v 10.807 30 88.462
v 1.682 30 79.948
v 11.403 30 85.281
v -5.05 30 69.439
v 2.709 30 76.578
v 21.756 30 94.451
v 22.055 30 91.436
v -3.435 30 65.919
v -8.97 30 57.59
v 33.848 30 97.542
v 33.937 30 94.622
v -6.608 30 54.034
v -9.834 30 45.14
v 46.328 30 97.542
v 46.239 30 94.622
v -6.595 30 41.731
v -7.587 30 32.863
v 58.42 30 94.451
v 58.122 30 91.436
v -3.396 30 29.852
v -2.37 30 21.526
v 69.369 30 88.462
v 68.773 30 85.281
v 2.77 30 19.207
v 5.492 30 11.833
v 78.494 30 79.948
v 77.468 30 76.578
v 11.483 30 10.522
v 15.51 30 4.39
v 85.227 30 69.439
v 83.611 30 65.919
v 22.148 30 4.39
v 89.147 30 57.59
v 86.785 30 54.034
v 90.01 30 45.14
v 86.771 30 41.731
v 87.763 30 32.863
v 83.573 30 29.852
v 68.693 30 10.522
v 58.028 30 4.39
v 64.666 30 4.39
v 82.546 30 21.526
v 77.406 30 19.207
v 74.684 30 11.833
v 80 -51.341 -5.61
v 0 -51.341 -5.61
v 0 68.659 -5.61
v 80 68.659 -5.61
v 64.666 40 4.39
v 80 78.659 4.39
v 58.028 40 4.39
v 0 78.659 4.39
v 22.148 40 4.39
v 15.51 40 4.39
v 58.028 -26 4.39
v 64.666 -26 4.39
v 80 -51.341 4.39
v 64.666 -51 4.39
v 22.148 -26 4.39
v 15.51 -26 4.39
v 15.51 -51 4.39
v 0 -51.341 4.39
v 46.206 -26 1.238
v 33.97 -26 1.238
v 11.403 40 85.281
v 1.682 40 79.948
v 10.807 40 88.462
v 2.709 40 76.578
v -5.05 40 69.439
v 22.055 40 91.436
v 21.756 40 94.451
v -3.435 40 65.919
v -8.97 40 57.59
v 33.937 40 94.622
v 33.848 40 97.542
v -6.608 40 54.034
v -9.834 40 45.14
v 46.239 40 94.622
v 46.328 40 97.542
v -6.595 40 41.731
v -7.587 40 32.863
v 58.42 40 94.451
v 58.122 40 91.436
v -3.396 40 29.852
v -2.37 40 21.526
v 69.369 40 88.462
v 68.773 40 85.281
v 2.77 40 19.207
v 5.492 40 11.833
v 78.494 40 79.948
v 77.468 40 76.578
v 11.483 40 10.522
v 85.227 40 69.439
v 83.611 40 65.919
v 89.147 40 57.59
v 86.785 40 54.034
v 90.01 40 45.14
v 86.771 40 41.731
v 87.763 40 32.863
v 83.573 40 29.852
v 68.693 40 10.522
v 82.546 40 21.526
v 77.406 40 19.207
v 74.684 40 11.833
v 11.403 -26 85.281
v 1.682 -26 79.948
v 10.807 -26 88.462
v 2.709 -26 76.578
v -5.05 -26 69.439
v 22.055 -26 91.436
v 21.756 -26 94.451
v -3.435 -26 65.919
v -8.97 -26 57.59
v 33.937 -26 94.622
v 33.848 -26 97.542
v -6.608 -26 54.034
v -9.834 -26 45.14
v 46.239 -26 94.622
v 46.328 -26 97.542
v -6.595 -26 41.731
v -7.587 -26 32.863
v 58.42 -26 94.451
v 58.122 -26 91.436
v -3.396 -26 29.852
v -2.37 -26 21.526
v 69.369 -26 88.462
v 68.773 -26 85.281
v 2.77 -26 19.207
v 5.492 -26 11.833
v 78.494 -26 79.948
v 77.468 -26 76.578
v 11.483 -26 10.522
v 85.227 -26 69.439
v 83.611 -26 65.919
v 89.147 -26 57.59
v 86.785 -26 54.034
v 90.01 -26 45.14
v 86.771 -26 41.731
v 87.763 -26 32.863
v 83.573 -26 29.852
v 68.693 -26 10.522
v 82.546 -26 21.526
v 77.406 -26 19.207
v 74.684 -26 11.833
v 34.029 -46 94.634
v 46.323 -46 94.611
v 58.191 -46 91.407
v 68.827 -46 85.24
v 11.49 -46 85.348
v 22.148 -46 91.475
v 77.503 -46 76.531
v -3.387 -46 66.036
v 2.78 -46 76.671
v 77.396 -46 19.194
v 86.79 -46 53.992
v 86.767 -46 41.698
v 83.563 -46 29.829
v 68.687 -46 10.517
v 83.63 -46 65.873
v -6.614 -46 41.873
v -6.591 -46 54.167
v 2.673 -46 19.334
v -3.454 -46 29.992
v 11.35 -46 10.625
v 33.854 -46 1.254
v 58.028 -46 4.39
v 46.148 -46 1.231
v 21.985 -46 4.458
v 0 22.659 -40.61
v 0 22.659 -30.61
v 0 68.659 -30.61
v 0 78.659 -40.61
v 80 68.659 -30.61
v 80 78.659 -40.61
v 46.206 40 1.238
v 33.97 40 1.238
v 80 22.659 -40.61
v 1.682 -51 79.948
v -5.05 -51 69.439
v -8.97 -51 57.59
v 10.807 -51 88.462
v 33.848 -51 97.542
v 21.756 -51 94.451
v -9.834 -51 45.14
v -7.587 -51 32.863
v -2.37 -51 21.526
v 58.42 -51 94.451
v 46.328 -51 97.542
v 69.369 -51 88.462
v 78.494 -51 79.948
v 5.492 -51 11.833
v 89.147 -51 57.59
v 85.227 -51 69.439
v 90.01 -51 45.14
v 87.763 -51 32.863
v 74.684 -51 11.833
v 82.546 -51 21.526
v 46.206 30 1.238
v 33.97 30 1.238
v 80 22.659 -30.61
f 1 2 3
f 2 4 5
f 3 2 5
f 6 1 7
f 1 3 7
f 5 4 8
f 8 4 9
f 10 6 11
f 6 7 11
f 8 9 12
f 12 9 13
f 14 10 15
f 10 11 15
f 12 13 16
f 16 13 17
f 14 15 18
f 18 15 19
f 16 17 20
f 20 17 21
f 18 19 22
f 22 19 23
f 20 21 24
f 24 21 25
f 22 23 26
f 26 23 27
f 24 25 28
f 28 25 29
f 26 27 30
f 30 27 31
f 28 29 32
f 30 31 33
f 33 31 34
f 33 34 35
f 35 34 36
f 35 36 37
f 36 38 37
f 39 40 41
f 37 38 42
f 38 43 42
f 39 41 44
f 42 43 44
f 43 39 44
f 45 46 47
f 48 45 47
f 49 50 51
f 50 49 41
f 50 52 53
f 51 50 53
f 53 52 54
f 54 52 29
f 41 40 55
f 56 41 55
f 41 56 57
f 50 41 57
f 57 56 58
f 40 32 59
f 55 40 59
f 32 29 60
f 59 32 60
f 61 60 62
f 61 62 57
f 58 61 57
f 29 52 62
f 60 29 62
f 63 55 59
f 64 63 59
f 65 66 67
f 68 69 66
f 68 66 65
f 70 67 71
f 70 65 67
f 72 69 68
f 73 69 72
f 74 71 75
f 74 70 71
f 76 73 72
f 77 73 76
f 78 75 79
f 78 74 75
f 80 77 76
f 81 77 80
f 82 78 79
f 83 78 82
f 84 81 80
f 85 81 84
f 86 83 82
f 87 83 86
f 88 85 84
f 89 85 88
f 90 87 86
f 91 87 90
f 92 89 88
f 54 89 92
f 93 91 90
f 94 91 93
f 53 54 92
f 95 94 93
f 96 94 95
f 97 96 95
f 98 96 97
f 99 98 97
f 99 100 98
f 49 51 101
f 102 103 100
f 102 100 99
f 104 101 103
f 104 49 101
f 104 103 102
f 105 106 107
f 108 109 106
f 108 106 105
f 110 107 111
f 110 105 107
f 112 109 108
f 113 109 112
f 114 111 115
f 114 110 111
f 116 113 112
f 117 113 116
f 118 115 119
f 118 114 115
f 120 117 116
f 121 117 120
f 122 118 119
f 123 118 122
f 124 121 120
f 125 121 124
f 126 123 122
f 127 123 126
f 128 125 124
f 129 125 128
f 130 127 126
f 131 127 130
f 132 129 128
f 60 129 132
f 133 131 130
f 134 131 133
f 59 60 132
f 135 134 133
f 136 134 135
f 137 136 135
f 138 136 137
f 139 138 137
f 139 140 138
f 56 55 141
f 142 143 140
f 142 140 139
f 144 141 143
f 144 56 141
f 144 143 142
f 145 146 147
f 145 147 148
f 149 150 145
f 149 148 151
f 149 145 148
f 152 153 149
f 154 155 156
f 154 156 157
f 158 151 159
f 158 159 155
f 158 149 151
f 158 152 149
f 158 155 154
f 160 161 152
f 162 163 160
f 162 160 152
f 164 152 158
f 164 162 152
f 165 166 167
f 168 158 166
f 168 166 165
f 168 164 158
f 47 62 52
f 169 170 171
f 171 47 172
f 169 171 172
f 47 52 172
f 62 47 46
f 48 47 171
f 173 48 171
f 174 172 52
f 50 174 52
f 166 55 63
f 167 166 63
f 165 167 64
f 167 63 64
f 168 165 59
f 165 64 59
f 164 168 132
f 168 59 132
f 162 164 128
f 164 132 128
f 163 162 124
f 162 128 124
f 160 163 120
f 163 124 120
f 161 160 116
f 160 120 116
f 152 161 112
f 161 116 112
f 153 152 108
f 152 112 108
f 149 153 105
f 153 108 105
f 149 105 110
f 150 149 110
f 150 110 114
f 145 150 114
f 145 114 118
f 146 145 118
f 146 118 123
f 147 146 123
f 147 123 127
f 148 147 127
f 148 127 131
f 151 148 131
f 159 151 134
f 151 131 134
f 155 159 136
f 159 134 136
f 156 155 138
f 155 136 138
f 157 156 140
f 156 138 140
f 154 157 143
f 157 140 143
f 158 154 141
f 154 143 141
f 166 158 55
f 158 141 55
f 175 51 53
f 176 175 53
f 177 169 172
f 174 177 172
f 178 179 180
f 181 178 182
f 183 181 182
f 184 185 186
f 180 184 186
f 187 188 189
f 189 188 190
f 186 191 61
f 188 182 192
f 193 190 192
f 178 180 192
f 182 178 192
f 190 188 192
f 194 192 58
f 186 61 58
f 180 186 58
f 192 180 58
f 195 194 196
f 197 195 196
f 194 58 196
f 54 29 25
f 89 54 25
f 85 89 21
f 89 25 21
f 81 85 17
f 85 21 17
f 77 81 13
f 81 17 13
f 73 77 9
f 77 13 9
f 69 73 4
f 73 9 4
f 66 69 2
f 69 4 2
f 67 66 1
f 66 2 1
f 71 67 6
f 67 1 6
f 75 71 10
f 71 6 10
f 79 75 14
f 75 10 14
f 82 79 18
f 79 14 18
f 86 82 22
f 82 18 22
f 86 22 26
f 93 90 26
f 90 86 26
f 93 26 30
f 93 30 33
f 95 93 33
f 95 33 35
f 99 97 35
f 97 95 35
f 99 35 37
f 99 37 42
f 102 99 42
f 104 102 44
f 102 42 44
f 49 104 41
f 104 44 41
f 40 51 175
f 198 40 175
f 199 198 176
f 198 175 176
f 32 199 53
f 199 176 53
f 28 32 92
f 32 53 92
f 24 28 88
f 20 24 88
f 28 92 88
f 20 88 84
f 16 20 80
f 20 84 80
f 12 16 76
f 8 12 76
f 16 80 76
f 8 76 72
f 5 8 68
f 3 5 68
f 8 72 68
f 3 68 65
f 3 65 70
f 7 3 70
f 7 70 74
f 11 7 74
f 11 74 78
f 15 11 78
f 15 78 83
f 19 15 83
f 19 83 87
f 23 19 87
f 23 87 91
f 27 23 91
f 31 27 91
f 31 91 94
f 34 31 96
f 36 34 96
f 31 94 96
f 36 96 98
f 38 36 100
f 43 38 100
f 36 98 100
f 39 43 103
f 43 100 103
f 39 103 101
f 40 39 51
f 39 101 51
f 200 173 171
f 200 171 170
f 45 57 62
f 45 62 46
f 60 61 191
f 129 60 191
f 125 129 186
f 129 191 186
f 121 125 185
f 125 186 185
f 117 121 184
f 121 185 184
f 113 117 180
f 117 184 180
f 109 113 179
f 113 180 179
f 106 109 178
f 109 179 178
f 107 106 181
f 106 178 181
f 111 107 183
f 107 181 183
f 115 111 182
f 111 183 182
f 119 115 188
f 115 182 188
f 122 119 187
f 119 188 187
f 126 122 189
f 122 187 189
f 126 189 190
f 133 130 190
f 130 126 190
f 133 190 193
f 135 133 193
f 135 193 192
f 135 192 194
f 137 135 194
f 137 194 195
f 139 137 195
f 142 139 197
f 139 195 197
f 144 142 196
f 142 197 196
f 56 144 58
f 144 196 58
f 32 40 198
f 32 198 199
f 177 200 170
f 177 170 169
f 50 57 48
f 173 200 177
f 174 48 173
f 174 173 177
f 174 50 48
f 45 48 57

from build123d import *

# Parameters (mm, degrees)
BOSS_EXTRUDE1_DEPTH = 80
SKETCH2_R           = 50
BOSS_EXTRUDE2_DEPTH = 10
SKETCH3_R           = 47.09331112
CUT_EXTRUDE1_DEPTH  = 10
SKETCH4_R           = 50
BOSS_EXTRUDE3_DEPTH = 25
SKETCH5_R           = 47.09331112
CUT_EXTRUDE2_DEPTH  = 20


with BuildPart() as part:
    # Sketch1 → Boss-Extrude1 (new body)
    with BuildSketch(Plane(origin=(0, 0, 0), x_dir=(0, 0, -1), z_dir=(1, 0, 0))):
        Polygon((40.609756098, 22.658536585), (40.609756098, 78.658536585), (-4.390243902, 78.658536585), (-4.390243902, -51.341463415), (5.609756098, -51.341463415), (5.609756098, 68.658536585), (30.609756098, 68.658536585), (30.609756098, 22.658536585), align=None)
    extrude(amount=BOSS_EXTRUDE1_DEPTH)

    # Sketch2 → Boss-Extrude2 (add)
    with BuildSketch(Plane(origin=(0, 30, 0), x_dir=(1, 0, 0), z_dir=(0, 1, 0))):
        with Locations((40.088163703, -47.932474998)):
            Circle(SKETCH2_R)
    extrude(amount=BOSS_EXTRUDE2_DEPTH)

    # Sketch3 → Cut-Extrude1 (cut)
    with BuildSketch(Plane(origin=(0, 40, 0), x_dir=(1, 0, 0), z_dir=(0, 1, 0))):
        with Locations(Location((40.088163703, -47.932474998, 0), (0, 0, 67.607335059))):
            Circle(SKETCH3_R)
    extrude(amount=-CUT_EXTRUDE1_DEPTH, mode=Mode.SUBTRACT)

    # Sketch4 → Boss-Extrude3 (add)
    with BuildSketch(Plane(origin=(0, -51, 0), x_dir=(1, 0, 0), z_dir=(0, 1, 0))):
        with Locations((40.088163703, -47.932474998)):
            Circle(SKETCH4_R)
    extrude(amount=BOSS_EXTRUDE3_DEPTH)

    # Sketch5 → Cut-Extrude2 (cut)
    with BuildSketch(Plane(origin=(0, -26, 0), x_dir=(1, 0, 0), z_dir=(0, 1, 0))):
        with Locations(Location((40.088163703, -47.932474998, 0), (0, 0, 67.607335059))):
            Circle(SKETCH5_R)
    extrude(amount=-CUT_EXTRUDE2_DEPTH, mode=Mode.SUBTRACT)


solid = part.part
